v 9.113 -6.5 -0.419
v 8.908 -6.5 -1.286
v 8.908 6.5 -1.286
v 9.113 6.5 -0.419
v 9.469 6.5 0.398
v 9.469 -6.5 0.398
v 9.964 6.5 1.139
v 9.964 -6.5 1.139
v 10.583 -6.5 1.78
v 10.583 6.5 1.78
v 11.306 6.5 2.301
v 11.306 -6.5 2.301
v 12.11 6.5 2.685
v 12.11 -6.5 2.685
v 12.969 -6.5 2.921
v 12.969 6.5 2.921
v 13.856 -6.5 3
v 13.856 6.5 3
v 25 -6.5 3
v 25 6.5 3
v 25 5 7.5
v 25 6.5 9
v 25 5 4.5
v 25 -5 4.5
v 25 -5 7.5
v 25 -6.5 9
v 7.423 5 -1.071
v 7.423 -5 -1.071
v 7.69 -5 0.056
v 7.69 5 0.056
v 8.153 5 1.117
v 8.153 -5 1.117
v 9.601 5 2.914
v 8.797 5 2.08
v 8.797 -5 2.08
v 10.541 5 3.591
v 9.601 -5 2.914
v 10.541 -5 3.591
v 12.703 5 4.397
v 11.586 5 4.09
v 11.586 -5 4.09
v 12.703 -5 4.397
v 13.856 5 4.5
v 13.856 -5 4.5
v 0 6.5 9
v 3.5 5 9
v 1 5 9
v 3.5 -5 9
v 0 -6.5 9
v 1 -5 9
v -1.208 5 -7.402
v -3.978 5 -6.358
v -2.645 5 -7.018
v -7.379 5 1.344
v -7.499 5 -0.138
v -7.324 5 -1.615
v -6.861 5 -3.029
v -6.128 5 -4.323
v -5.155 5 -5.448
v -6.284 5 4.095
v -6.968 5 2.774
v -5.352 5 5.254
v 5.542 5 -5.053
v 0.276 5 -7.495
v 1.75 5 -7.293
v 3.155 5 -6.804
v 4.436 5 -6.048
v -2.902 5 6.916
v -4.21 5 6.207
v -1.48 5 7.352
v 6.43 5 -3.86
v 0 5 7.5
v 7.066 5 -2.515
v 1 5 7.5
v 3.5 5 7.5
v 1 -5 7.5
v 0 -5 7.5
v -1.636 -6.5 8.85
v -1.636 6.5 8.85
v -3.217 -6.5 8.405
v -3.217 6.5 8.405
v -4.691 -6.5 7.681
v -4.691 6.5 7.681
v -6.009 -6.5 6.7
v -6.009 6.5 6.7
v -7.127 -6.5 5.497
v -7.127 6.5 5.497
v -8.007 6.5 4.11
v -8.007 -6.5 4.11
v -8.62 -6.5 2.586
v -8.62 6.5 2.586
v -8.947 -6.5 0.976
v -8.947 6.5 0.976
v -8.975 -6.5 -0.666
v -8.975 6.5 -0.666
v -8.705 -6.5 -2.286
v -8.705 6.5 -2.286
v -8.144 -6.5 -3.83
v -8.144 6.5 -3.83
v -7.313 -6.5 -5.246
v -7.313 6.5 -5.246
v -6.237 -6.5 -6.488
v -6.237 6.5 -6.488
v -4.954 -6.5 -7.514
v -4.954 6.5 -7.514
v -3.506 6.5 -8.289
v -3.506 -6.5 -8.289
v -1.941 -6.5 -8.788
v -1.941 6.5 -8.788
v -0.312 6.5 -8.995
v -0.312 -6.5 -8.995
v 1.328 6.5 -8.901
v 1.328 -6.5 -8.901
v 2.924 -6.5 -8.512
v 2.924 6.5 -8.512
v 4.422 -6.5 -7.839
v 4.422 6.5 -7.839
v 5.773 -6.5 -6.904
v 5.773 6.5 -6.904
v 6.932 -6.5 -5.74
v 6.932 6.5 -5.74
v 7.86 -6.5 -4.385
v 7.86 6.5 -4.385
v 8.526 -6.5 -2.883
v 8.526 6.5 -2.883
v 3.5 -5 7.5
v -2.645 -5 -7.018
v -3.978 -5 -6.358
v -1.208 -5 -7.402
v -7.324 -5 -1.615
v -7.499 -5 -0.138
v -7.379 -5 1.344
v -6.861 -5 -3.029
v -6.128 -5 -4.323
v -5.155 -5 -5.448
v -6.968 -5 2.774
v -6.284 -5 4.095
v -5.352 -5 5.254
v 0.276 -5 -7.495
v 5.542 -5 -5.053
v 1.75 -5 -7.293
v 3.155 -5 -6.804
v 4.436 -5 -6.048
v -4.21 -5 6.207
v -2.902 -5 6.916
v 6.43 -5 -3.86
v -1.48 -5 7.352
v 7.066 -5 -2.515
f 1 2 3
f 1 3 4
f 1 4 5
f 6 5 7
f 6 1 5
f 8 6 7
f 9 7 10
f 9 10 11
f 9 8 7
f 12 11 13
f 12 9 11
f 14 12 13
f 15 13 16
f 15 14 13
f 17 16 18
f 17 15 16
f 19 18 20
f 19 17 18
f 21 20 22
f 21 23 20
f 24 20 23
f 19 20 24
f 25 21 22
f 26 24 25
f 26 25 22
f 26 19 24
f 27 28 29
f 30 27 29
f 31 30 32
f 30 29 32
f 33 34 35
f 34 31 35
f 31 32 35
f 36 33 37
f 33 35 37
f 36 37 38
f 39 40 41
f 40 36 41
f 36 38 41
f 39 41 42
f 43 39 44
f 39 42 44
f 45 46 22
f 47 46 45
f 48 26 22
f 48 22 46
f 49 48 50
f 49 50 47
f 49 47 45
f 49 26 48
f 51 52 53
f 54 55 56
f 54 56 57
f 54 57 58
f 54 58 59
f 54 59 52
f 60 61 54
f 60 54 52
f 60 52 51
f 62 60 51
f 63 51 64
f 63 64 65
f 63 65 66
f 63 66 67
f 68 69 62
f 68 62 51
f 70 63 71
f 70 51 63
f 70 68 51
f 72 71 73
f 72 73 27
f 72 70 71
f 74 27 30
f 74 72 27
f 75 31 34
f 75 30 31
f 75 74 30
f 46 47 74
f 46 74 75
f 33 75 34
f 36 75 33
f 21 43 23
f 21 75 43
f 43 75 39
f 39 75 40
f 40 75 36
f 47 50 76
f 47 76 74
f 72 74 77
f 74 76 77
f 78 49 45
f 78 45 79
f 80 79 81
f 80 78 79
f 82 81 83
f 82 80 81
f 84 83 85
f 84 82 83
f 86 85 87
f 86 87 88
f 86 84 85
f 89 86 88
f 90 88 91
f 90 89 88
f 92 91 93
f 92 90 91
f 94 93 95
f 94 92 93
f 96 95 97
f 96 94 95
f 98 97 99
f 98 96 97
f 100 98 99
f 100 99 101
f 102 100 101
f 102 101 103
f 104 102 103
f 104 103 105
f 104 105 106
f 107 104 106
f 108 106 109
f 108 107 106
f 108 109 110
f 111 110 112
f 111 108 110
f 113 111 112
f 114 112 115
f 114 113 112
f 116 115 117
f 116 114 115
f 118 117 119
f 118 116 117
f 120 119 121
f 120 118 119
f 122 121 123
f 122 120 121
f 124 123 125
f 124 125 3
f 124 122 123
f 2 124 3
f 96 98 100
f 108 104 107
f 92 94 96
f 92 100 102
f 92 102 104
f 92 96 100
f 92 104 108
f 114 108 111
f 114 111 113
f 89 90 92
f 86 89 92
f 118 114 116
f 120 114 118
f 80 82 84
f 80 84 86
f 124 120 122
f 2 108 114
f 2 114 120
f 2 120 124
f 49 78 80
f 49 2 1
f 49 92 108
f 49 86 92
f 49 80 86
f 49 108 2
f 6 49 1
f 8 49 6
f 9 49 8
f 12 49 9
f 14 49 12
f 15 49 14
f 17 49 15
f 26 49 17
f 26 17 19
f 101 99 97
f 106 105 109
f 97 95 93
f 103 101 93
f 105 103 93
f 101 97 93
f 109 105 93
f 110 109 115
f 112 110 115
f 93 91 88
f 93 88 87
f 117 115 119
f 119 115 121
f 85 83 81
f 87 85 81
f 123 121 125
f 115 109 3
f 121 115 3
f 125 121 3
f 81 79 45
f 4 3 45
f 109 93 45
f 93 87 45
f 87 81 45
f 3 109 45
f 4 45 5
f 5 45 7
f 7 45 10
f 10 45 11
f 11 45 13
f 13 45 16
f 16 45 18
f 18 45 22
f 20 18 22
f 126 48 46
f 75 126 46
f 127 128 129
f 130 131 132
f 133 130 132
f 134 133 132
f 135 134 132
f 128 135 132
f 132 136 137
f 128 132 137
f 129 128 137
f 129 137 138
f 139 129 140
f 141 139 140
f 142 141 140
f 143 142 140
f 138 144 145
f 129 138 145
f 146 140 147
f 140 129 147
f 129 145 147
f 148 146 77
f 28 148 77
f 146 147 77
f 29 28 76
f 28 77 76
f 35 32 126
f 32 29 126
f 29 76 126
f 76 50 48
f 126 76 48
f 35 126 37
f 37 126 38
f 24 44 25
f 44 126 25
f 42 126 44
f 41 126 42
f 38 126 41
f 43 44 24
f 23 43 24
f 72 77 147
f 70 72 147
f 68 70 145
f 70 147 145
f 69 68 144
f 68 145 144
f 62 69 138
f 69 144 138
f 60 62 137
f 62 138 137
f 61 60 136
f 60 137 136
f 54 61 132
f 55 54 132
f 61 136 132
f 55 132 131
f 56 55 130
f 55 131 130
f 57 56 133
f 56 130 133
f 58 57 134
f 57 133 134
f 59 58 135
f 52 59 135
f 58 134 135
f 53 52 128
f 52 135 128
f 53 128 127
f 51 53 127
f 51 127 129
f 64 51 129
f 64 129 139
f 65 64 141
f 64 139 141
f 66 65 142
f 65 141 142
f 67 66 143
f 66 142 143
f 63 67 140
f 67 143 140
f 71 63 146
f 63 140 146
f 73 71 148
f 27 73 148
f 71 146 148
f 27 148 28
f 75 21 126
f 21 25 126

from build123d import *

# Parameters (mm, degrees)
F1_DEPTH = 6.5
F2_T     = -1.5
F3_W     = 2.5
F3_H     = 10
F4_DEPTH = 1.5


with BuildPart() as f1:
    # F0 (on Front) → F1 (new body, symmetric)
    with BuildSketch(Plane.XZ):
        with BuildLine():
            Line((25, 9), (0, 9))
            ThreePointArc((0, 9), (-6.803361, -5.891883), (8.90769, -1.285714))
            ThreePointArc((8.90769, -1.285714), (10.583138, 1.779645), (13.856406, 3))
            Line((13.856406, 3), (25, 3))
            Line((25, 3), (25, 9))
        make_face()
    extrude(amount=F1_DEPTH, both=True)

    # F2
    f2_openings = [f1.faces().sort_by_distance(p)[0] for p in [
        (25, 0, 6),
    ]]
    offset(amount=F2_T, openings=f2_openings)

    # F3 (on face) → F4 (cut)
    with BuildSketch(Plane.XY.offset(9)):
        with Locations((2.25, 0)):
            Rectangle(F3_W, F3_H)
    extrude(amount=-F4_DEPTH, mode=Mode.SUBTRACT)


solid = f1.part
